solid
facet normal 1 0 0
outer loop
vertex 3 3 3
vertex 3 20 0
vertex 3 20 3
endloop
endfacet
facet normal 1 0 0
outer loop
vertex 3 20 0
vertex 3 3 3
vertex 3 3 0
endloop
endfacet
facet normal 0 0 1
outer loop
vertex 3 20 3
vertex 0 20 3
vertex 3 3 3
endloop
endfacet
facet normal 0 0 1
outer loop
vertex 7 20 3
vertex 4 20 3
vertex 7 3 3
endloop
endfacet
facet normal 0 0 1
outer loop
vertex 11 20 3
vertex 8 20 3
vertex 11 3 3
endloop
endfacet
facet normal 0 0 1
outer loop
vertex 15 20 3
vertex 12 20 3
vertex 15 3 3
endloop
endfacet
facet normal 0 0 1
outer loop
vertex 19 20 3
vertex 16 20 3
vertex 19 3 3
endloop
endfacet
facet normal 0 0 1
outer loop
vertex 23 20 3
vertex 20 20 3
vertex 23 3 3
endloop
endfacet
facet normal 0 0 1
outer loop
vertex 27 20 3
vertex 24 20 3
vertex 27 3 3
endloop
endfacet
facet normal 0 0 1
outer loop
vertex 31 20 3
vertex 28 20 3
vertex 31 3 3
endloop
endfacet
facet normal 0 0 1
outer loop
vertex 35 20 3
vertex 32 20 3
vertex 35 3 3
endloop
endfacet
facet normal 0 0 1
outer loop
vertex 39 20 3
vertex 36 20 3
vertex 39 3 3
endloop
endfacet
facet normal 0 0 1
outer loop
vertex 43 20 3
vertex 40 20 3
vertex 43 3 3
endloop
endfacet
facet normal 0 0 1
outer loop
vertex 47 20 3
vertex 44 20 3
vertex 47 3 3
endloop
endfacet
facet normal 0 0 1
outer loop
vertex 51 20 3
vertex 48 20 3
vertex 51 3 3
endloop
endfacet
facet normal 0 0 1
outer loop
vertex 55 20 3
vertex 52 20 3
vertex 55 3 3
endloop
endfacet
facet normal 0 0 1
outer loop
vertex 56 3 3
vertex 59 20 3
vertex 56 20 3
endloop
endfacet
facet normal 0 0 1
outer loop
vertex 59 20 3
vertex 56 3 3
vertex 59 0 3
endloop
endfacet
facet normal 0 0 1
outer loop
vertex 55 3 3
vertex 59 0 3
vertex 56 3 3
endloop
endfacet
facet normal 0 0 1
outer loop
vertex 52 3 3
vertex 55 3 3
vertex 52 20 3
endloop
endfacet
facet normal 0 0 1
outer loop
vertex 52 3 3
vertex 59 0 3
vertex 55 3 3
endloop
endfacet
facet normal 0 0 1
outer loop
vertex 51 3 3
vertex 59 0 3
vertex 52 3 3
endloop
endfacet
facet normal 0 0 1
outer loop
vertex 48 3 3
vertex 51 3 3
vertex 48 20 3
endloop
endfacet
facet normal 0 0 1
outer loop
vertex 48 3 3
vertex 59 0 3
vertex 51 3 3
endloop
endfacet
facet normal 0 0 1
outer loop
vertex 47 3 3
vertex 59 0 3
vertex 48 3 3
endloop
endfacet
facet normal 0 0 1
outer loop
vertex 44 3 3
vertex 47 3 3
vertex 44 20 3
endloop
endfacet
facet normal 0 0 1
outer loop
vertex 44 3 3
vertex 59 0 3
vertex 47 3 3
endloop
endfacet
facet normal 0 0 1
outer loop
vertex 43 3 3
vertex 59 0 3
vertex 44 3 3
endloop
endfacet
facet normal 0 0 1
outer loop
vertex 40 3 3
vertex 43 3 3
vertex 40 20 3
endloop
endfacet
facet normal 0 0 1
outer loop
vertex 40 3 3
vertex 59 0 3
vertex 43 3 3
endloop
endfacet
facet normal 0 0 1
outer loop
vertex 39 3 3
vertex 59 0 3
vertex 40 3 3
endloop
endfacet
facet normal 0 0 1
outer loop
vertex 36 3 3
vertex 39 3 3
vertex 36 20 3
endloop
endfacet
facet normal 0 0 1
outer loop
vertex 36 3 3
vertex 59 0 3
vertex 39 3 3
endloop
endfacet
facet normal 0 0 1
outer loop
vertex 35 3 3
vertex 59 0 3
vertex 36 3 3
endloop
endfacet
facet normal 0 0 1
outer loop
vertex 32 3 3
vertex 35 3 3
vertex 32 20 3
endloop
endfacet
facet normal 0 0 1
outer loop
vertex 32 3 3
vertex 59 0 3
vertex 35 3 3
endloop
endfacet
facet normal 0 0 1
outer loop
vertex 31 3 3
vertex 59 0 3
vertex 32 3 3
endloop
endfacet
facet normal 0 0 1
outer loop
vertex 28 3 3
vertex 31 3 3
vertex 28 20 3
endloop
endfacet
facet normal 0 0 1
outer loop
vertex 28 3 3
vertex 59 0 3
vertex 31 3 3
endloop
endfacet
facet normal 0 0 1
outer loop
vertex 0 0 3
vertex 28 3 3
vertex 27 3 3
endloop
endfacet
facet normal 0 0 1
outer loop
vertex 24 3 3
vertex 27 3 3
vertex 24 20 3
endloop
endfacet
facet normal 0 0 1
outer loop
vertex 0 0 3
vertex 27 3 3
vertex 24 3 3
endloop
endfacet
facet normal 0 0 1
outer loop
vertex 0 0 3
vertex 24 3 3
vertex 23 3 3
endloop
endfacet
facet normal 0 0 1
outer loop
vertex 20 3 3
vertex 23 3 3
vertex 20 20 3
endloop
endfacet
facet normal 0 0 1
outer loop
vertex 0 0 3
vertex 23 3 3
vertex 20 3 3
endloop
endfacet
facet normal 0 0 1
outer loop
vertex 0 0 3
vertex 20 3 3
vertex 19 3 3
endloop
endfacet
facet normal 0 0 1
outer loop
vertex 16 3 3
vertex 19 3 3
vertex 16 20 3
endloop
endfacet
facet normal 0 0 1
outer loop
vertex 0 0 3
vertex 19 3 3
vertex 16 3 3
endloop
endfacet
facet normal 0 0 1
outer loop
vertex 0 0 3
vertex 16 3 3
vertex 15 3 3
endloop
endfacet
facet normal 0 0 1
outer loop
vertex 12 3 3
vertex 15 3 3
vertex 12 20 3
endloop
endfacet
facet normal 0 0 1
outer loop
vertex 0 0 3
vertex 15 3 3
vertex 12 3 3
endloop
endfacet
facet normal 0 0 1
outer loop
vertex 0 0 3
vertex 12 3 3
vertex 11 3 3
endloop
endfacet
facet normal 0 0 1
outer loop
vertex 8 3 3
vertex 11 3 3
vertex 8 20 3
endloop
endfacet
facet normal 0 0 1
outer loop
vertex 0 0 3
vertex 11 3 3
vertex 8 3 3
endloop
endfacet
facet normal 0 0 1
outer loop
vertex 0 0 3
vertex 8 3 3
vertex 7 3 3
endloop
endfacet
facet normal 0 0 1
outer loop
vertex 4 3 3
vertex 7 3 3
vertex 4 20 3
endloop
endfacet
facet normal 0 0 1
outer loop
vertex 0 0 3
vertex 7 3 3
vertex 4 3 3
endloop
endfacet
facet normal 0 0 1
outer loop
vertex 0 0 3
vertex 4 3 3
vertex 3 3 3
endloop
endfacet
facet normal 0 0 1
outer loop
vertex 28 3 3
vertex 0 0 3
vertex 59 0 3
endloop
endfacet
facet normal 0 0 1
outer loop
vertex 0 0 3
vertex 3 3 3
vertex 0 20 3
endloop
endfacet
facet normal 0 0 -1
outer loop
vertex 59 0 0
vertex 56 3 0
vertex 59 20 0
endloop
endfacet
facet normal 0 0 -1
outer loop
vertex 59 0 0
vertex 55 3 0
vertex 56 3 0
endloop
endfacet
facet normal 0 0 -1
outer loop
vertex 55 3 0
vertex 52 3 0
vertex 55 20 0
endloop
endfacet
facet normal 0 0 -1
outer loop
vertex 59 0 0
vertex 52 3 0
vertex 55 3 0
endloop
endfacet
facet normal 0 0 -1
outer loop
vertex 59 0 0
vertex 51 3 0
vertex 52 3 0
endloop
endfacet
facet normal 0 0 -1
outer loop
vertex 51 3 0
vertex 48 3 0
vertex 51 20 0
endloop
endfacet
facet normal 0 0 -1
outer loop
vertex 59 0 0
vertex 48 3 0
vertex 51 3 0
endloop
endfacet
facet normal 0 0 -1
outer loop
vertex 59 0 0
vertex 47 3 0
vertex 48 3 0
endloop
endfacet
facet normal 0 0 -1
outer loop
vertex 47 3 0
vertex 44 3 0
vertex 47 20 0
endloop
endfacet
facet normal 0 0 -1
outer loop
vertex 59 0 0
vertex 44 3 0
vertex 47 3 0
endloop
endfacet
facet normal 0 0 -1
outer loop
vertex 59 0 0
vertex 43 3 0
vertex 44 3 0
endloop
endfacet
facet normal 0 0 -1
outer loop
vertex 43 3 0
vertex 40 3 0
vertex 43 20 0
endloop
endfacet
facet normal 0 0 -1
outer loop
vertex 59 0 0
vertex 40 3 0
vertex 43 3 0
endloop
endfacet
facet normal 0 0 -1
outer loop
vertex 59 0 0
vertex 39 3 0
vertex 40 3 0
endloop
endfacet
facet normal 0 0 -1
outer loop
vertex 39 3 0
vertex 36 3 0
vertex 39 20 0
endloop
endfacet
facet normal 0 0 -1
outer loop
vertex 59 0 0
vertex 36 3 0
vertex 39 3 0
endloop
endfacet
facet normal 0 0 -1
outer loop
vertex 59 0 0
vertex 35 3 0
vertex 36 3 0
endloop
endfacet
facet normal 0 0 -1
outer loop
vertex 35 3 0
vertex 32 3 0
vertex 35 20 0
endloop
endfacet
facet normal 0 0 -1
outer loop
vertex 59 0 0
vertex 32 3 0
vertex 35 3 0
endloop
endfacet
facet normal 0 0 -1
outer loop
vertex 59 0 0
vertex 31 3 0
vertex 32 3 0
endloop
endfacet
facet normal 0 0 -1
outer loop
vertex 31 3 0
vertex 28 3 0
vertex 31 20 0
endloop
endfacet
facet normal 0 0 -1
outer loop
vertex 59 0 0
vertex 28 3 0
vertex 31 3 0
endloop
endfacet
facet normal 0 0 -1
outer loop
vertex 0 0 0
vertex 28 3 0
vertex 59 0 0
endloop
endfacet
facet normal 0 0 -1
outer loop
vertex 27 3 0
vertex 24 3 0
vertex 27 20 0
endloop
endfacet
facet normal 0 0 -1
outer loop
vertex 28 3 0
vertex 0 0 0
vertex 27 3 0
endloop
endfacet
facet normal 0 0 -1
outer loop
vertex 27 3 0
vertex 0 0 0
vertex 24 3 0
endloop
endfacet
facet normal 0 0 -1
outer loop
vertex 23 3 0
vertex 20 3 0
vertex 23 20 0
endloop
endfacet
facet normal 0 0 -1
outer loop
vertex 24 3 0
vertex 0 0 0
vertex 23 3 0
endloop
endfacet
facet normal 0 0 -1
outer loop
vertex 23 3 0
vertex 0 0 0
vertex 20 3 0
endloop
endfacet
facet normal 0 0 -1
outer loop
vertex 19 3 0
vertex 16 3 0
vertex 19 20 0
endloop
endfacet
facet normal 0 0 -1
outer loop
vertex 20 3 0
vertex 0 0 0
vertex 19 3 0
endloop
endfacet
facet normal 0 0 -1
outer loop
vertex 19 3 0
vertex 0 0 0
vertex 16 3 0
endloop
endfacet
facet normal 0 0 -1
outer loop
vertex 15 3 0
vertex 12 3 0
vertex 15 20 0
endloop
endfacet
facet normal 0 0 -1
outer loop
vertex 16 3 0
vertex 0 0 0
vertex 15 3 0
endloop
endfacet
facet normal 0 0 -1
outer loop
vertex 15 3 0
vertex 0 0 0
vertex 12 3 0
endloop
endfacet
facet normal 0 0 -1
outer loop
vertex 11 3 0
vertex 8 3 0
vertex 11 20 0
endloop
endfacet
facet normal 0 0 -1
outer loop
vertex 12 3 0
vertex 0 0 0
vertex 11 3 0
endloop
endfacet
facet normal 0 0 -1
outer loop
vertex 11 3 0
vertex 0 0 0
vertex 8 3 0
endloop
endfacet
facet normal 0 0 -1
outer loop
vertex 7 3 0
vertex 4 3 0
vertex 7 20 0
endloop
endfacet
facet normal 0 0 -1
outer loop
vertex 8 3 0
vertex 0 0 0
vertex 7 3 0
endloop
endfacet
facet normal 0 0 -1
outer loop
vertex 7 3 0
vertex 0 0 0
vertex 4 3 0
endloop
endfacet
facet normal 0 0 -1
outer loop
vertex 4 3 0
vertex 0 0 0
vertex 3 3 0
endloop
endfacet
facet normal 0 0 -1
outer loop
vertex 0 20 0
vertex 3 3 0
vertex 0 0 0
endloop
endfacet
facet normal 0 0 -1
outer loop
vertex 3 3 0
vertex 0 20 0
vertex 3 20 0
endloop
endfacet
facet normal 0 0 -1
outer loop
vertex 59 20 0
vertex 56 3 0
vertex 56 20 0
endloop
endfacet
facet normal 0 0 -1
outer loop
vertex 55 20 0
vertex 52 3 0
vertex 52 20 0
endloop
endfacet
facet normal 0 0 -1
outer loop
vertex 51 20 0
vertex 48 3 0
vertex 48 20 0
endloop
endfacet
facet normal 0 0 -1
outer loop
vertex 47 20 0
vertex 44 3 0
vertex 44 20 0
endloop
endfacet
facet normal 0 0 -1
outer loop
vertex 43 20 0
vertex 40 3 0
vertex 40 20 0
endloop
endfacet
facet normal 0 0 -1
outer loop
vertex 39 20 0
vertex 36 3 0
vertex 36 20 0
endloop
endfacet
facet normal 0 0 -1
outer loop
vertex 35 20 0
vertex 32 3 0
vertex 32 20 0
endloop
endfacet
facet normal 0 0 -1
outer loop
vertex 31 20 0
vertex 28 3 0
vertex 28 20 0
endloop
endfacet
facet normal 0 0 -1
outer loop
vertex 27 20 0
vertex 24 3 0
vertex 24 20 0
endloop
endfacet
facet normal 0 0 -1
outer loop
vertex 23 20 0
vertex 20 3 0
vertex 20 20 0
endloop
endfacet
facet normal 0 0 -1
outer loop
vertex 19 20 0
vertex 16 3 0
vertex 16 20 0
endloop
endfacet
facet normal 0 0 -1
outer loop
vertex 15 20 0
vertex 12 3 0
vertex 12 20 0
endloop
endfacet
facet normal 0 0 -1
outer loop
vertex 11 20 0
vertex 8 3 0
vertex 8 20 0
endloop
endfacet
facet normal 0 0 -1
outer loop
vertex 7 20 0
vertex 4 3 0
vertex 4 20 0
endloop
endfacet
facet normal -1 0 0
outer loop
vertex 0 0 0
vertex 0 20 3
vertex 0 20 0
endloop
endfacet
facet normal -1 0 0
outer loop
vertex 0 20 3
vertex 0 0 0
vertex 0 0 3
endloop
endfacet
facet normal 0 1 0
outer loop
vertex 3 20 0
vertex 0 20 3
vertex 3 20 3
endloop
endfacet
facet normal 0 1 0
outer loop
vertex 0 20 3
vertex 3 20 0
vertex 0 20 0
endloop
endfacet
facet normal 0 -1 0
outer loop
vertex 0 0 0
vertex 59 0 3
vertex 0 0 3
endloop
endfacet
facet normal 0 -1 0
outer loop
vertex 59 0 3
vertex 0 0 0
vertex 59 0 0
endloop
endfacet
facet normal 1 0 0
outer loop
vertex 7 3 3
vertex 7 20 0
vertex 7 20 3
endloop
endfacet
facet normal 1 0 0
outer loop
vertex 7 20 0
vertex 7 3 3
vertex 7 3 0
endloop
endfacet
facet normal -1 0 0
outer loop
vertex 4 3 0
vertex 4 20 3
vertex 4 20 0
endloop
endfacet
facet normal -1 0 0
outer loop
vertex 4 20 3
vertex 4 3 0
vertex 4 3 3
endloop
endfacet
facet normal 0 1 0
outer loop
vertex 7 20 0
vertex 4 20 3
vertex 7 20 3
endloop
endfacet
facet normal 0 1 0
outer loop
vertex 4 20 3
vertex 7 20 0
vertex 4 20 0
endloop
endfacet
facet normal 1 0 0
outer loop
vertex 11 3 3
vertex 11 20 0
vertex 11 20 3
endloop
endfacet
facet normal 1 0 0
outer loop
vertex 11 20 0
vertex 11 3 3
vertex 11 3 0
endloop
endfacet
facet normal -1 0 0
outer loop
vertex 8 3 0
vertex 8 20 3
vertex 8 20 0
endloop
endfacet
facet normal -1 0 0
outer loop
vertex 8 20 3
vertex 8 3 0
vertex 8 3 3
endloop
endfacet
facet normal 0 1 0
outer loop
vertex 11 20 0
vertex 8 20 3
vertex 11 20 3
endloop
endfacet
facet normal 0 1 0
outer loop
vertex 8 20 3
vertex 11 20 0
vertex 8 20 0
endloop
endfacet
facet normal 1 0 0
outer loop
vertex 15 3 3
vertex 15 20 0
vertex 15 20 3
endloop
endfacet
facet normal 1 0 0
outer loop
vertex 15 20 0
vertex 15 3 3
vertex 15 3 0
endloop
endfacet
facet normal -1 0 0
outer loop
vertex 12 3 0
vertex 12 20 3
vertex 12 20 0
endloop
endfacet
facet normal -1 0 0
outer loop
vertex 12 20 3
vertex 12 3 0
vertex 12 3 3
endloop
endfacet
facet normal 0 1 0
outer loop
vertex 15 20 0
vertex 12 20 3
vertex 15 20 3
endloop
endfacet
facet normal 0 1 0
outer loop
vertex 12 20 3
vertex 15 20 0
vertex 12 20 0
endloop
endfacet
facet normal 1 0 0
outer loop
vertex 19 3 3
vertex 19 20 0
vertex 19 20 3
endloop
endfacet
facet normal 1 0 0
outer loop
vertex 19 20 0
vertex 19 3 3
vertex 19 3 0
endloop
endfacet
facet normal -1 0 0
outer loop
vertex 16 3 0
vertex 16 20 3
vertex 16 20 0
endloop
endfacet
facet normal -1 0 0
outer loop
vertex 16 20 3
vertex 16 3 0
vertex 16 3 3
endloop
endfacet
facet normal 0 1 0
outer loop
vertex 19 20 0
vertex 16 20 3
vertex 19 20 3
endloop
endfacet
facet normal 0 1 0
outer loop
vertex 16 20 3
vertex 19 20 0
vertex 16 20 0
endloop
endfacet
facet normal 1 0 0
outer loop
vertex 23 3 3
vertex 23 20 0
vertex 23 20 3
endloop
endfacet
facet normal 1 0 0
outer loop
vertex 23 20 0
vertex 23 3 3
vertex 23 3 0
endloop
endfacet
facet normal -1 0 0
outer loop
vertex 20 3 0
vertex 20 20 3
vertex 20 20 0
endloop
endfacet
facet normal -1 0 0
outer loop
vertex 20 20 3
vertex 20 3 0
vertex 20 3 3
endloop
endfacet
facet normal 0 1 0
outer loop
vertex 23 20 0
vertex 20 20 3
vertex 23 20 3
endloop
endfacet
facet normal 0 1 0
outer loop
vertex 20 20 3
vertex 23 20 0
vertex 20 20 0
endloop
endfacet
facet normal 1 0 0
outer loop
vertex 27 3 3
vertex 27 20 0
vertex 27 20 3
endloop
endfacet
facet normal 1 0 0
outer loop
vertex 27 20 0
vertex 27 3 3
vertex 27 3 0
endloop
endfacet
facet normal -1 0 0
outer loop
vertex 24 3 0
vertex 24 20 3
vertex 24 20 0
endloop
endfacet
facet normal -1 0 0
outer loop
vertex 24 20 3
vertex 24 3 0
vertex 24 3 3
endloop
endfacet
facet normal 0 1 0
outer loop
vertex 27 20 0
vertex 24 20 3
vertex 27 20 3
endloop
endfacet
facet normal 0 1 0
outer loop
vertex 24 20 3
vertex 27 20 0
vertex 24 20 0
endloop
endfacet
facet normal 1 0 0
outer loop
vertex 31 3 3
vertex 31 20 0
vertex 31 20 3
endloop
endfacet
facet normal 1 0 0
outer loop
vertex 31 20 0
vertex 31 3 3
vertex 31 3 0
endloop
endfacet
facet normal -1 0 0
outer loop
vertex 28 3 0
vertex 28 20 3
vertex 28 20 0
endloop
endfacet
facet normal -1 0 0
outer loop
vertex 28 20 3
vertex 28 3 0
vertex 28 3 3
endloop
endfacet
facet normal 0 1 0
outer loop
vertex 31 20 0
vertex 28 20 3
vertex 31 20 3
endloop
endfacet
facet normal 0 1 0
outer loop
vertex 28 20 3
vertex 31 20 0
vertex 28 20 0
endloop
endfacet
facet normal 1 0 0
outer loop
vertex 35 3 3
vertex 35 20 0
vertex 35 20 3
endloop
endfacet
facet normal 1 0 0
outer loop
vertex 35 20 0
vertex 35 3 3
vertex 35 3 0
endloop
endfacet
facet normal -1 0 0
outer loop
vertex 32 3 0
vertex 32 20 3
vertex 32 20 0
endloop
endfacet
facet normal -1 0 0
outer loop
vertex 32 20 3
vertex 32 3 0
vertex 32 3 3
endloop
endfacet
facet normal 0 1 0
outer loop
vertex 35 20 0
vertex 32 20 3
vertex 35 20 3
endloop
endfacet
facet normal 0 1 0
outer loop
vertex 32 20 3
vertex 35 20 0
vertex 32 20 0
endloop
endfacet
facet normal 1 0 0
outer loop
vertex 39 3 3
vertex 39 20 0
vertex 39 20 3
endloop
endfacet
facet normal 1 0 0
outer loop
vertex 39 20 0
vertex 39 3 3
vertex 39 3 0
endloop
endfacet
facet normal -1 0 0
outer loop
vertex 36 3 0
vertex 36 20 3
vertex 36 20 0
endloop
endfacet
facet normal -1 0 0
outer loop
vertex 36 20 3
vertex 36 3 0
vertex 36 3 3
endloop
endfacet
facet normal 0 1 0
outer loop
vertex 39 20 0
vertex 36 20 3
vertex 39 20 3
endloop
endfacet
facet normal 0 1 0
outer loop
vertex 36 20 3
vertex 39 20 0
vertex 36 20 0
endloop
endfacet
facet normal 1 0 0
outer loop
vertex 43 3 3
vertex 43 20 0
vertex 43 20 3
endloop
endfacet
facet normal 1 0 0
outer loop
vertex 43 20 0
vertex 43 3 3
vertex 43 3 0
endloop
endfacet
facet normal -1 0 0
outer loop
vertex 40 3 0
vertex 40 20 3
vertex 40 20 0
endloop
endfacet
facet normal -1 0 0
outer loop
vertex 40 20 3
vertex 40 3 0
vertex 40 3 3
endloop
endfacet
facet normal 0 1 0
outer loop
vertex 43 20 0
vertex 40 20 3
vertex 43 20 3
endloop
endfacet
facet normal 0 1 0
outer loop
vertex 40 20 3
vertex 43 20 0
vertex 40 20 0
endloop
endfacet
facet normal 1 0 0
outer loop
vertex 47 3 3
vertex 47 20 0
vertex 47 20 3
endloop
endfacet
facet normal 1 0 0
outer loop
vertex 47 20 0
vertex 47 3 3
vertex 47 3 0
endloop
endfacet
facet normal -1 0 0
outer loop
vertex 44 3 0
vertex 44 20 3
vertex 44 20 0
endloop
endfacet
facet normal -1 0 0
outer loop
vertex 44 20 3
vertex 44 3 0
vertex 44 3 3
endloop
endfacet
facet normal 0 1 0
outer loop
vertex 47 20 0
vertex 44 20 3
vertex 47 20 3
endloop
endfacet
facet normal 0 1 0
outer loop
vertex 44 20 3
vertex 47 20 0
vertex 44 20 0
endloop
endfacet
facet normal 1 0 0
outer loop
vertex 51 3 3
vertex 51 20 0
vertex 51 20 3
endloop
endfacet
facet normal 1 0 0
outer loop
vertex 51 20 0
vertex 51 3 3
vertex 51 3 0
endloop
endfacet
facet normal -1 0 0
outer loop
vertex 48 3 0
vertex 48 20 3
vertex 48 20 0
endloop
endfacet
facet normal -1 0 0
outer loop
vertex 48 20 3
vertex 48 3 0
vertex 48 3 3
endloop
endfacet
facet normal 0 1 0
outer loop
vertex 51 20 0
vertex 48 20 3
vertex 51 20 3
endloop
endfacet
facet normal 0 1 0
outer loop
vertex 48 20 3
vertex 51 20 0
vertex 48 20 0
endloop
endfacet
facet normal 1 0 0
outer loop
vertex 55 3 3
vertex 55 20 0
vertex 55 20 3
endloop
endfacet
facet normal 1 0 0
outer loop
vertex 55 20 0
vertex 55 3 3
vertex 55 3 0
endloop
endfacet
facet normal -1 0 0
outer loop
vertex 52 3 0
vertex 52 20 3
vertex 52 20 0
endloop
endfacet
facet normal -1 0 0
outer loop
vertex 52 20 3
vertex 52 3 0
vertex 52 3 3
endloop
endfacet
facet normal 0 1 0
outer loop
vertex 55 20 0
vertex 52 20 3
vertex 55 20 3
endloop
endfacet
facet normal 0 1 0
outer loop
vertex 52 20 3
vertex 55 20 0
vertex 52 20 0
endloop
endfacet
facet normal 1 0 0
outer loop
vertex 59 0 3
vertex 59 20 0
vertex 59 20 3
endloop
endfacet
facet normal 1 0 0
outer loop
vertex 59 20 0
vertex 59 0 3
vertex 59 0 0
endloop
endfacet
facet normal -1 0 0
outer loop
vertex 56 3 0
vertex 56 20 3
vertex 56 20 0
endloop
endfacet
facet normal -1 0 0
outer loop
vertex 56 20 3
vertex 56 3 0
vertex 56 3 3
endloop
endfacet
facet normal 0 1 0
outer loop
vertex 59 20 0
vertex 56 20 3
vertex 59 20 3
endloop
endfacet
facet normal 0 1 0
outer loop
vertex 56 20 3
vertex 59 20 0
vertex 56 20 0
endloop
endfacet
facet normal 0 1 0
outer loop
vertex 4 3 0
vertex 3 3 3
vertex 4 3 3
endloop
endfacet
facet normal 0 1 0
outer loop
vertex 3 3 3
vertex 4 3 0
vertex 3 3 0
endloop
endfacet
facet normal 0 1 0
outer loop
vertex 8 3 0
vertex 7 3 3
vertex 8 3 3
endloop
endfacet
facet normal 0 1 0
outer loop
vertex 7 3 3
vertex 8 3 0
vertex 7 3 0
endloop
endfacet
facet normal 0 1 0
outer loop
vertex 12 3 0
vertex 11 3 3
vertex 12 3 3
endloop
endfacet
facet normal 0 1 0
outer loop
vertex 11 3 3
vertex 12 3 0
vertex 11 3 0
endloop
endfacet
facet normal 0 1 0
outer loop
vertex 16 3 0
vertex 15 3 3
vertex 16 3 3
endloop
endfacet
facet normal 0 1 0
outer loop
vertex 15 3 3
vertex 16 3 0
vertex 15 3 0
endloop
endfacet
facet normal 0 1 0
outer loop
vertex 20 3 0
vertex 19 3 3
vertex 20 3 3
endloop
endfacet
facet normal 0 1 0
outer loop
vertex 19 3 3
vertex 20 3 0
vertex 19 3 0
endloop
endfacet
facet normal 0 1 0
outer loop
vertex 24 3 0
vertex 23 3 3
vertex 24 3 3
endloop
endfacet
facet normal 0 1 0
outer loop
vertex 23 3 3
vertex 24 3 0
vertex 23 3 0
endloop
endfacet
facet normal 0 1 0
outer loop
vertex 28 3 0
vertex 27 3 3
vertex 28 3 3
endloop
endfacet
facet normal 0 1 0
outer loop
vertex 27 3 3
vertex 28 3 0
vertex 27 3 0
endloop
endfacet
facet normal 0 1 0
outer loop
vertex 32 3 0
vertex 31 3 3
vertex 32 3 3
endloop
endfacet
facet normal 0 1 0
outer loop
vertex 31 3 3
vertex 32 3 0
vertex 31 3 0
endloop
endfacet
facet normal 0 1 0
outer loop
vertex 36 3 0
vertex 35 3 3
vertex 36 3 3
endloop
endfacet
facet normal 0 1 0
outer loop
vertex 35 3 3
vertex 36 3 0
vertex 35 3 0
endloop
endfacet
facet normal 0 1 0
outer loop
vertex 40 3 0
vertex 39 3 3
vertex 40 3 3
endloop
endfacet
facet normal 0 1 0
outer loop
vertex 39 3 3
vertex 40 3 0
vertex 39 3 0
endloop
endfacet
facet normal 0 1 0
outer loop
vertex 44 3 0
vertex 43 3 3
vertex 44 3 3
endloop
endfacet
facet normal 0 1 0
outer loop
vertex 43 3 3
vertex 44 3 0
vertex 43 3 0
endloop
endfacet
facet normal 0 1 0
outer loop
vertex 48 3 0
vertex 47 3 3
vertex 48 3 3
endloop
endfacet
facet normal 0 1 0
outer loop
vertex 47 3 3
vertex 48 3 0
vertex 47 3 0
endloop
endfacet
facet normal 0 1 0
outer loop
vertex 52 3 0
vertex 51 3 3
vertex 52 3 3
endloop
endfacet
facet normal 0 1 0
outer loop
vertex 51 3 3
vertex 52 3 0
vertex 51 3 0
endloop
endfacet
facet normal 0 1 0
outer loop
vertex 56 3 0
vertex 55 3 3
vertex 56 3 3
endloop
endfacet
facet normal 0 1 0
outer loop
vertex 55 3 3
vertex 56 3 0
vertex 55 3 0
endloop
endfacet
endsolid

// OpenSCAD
cube([59, 3, 3]);
for(x = [0 : 4 : 56]) {
	translate([x, 0, 0]) {
		cube([3, 20, 3]);
	}
}
